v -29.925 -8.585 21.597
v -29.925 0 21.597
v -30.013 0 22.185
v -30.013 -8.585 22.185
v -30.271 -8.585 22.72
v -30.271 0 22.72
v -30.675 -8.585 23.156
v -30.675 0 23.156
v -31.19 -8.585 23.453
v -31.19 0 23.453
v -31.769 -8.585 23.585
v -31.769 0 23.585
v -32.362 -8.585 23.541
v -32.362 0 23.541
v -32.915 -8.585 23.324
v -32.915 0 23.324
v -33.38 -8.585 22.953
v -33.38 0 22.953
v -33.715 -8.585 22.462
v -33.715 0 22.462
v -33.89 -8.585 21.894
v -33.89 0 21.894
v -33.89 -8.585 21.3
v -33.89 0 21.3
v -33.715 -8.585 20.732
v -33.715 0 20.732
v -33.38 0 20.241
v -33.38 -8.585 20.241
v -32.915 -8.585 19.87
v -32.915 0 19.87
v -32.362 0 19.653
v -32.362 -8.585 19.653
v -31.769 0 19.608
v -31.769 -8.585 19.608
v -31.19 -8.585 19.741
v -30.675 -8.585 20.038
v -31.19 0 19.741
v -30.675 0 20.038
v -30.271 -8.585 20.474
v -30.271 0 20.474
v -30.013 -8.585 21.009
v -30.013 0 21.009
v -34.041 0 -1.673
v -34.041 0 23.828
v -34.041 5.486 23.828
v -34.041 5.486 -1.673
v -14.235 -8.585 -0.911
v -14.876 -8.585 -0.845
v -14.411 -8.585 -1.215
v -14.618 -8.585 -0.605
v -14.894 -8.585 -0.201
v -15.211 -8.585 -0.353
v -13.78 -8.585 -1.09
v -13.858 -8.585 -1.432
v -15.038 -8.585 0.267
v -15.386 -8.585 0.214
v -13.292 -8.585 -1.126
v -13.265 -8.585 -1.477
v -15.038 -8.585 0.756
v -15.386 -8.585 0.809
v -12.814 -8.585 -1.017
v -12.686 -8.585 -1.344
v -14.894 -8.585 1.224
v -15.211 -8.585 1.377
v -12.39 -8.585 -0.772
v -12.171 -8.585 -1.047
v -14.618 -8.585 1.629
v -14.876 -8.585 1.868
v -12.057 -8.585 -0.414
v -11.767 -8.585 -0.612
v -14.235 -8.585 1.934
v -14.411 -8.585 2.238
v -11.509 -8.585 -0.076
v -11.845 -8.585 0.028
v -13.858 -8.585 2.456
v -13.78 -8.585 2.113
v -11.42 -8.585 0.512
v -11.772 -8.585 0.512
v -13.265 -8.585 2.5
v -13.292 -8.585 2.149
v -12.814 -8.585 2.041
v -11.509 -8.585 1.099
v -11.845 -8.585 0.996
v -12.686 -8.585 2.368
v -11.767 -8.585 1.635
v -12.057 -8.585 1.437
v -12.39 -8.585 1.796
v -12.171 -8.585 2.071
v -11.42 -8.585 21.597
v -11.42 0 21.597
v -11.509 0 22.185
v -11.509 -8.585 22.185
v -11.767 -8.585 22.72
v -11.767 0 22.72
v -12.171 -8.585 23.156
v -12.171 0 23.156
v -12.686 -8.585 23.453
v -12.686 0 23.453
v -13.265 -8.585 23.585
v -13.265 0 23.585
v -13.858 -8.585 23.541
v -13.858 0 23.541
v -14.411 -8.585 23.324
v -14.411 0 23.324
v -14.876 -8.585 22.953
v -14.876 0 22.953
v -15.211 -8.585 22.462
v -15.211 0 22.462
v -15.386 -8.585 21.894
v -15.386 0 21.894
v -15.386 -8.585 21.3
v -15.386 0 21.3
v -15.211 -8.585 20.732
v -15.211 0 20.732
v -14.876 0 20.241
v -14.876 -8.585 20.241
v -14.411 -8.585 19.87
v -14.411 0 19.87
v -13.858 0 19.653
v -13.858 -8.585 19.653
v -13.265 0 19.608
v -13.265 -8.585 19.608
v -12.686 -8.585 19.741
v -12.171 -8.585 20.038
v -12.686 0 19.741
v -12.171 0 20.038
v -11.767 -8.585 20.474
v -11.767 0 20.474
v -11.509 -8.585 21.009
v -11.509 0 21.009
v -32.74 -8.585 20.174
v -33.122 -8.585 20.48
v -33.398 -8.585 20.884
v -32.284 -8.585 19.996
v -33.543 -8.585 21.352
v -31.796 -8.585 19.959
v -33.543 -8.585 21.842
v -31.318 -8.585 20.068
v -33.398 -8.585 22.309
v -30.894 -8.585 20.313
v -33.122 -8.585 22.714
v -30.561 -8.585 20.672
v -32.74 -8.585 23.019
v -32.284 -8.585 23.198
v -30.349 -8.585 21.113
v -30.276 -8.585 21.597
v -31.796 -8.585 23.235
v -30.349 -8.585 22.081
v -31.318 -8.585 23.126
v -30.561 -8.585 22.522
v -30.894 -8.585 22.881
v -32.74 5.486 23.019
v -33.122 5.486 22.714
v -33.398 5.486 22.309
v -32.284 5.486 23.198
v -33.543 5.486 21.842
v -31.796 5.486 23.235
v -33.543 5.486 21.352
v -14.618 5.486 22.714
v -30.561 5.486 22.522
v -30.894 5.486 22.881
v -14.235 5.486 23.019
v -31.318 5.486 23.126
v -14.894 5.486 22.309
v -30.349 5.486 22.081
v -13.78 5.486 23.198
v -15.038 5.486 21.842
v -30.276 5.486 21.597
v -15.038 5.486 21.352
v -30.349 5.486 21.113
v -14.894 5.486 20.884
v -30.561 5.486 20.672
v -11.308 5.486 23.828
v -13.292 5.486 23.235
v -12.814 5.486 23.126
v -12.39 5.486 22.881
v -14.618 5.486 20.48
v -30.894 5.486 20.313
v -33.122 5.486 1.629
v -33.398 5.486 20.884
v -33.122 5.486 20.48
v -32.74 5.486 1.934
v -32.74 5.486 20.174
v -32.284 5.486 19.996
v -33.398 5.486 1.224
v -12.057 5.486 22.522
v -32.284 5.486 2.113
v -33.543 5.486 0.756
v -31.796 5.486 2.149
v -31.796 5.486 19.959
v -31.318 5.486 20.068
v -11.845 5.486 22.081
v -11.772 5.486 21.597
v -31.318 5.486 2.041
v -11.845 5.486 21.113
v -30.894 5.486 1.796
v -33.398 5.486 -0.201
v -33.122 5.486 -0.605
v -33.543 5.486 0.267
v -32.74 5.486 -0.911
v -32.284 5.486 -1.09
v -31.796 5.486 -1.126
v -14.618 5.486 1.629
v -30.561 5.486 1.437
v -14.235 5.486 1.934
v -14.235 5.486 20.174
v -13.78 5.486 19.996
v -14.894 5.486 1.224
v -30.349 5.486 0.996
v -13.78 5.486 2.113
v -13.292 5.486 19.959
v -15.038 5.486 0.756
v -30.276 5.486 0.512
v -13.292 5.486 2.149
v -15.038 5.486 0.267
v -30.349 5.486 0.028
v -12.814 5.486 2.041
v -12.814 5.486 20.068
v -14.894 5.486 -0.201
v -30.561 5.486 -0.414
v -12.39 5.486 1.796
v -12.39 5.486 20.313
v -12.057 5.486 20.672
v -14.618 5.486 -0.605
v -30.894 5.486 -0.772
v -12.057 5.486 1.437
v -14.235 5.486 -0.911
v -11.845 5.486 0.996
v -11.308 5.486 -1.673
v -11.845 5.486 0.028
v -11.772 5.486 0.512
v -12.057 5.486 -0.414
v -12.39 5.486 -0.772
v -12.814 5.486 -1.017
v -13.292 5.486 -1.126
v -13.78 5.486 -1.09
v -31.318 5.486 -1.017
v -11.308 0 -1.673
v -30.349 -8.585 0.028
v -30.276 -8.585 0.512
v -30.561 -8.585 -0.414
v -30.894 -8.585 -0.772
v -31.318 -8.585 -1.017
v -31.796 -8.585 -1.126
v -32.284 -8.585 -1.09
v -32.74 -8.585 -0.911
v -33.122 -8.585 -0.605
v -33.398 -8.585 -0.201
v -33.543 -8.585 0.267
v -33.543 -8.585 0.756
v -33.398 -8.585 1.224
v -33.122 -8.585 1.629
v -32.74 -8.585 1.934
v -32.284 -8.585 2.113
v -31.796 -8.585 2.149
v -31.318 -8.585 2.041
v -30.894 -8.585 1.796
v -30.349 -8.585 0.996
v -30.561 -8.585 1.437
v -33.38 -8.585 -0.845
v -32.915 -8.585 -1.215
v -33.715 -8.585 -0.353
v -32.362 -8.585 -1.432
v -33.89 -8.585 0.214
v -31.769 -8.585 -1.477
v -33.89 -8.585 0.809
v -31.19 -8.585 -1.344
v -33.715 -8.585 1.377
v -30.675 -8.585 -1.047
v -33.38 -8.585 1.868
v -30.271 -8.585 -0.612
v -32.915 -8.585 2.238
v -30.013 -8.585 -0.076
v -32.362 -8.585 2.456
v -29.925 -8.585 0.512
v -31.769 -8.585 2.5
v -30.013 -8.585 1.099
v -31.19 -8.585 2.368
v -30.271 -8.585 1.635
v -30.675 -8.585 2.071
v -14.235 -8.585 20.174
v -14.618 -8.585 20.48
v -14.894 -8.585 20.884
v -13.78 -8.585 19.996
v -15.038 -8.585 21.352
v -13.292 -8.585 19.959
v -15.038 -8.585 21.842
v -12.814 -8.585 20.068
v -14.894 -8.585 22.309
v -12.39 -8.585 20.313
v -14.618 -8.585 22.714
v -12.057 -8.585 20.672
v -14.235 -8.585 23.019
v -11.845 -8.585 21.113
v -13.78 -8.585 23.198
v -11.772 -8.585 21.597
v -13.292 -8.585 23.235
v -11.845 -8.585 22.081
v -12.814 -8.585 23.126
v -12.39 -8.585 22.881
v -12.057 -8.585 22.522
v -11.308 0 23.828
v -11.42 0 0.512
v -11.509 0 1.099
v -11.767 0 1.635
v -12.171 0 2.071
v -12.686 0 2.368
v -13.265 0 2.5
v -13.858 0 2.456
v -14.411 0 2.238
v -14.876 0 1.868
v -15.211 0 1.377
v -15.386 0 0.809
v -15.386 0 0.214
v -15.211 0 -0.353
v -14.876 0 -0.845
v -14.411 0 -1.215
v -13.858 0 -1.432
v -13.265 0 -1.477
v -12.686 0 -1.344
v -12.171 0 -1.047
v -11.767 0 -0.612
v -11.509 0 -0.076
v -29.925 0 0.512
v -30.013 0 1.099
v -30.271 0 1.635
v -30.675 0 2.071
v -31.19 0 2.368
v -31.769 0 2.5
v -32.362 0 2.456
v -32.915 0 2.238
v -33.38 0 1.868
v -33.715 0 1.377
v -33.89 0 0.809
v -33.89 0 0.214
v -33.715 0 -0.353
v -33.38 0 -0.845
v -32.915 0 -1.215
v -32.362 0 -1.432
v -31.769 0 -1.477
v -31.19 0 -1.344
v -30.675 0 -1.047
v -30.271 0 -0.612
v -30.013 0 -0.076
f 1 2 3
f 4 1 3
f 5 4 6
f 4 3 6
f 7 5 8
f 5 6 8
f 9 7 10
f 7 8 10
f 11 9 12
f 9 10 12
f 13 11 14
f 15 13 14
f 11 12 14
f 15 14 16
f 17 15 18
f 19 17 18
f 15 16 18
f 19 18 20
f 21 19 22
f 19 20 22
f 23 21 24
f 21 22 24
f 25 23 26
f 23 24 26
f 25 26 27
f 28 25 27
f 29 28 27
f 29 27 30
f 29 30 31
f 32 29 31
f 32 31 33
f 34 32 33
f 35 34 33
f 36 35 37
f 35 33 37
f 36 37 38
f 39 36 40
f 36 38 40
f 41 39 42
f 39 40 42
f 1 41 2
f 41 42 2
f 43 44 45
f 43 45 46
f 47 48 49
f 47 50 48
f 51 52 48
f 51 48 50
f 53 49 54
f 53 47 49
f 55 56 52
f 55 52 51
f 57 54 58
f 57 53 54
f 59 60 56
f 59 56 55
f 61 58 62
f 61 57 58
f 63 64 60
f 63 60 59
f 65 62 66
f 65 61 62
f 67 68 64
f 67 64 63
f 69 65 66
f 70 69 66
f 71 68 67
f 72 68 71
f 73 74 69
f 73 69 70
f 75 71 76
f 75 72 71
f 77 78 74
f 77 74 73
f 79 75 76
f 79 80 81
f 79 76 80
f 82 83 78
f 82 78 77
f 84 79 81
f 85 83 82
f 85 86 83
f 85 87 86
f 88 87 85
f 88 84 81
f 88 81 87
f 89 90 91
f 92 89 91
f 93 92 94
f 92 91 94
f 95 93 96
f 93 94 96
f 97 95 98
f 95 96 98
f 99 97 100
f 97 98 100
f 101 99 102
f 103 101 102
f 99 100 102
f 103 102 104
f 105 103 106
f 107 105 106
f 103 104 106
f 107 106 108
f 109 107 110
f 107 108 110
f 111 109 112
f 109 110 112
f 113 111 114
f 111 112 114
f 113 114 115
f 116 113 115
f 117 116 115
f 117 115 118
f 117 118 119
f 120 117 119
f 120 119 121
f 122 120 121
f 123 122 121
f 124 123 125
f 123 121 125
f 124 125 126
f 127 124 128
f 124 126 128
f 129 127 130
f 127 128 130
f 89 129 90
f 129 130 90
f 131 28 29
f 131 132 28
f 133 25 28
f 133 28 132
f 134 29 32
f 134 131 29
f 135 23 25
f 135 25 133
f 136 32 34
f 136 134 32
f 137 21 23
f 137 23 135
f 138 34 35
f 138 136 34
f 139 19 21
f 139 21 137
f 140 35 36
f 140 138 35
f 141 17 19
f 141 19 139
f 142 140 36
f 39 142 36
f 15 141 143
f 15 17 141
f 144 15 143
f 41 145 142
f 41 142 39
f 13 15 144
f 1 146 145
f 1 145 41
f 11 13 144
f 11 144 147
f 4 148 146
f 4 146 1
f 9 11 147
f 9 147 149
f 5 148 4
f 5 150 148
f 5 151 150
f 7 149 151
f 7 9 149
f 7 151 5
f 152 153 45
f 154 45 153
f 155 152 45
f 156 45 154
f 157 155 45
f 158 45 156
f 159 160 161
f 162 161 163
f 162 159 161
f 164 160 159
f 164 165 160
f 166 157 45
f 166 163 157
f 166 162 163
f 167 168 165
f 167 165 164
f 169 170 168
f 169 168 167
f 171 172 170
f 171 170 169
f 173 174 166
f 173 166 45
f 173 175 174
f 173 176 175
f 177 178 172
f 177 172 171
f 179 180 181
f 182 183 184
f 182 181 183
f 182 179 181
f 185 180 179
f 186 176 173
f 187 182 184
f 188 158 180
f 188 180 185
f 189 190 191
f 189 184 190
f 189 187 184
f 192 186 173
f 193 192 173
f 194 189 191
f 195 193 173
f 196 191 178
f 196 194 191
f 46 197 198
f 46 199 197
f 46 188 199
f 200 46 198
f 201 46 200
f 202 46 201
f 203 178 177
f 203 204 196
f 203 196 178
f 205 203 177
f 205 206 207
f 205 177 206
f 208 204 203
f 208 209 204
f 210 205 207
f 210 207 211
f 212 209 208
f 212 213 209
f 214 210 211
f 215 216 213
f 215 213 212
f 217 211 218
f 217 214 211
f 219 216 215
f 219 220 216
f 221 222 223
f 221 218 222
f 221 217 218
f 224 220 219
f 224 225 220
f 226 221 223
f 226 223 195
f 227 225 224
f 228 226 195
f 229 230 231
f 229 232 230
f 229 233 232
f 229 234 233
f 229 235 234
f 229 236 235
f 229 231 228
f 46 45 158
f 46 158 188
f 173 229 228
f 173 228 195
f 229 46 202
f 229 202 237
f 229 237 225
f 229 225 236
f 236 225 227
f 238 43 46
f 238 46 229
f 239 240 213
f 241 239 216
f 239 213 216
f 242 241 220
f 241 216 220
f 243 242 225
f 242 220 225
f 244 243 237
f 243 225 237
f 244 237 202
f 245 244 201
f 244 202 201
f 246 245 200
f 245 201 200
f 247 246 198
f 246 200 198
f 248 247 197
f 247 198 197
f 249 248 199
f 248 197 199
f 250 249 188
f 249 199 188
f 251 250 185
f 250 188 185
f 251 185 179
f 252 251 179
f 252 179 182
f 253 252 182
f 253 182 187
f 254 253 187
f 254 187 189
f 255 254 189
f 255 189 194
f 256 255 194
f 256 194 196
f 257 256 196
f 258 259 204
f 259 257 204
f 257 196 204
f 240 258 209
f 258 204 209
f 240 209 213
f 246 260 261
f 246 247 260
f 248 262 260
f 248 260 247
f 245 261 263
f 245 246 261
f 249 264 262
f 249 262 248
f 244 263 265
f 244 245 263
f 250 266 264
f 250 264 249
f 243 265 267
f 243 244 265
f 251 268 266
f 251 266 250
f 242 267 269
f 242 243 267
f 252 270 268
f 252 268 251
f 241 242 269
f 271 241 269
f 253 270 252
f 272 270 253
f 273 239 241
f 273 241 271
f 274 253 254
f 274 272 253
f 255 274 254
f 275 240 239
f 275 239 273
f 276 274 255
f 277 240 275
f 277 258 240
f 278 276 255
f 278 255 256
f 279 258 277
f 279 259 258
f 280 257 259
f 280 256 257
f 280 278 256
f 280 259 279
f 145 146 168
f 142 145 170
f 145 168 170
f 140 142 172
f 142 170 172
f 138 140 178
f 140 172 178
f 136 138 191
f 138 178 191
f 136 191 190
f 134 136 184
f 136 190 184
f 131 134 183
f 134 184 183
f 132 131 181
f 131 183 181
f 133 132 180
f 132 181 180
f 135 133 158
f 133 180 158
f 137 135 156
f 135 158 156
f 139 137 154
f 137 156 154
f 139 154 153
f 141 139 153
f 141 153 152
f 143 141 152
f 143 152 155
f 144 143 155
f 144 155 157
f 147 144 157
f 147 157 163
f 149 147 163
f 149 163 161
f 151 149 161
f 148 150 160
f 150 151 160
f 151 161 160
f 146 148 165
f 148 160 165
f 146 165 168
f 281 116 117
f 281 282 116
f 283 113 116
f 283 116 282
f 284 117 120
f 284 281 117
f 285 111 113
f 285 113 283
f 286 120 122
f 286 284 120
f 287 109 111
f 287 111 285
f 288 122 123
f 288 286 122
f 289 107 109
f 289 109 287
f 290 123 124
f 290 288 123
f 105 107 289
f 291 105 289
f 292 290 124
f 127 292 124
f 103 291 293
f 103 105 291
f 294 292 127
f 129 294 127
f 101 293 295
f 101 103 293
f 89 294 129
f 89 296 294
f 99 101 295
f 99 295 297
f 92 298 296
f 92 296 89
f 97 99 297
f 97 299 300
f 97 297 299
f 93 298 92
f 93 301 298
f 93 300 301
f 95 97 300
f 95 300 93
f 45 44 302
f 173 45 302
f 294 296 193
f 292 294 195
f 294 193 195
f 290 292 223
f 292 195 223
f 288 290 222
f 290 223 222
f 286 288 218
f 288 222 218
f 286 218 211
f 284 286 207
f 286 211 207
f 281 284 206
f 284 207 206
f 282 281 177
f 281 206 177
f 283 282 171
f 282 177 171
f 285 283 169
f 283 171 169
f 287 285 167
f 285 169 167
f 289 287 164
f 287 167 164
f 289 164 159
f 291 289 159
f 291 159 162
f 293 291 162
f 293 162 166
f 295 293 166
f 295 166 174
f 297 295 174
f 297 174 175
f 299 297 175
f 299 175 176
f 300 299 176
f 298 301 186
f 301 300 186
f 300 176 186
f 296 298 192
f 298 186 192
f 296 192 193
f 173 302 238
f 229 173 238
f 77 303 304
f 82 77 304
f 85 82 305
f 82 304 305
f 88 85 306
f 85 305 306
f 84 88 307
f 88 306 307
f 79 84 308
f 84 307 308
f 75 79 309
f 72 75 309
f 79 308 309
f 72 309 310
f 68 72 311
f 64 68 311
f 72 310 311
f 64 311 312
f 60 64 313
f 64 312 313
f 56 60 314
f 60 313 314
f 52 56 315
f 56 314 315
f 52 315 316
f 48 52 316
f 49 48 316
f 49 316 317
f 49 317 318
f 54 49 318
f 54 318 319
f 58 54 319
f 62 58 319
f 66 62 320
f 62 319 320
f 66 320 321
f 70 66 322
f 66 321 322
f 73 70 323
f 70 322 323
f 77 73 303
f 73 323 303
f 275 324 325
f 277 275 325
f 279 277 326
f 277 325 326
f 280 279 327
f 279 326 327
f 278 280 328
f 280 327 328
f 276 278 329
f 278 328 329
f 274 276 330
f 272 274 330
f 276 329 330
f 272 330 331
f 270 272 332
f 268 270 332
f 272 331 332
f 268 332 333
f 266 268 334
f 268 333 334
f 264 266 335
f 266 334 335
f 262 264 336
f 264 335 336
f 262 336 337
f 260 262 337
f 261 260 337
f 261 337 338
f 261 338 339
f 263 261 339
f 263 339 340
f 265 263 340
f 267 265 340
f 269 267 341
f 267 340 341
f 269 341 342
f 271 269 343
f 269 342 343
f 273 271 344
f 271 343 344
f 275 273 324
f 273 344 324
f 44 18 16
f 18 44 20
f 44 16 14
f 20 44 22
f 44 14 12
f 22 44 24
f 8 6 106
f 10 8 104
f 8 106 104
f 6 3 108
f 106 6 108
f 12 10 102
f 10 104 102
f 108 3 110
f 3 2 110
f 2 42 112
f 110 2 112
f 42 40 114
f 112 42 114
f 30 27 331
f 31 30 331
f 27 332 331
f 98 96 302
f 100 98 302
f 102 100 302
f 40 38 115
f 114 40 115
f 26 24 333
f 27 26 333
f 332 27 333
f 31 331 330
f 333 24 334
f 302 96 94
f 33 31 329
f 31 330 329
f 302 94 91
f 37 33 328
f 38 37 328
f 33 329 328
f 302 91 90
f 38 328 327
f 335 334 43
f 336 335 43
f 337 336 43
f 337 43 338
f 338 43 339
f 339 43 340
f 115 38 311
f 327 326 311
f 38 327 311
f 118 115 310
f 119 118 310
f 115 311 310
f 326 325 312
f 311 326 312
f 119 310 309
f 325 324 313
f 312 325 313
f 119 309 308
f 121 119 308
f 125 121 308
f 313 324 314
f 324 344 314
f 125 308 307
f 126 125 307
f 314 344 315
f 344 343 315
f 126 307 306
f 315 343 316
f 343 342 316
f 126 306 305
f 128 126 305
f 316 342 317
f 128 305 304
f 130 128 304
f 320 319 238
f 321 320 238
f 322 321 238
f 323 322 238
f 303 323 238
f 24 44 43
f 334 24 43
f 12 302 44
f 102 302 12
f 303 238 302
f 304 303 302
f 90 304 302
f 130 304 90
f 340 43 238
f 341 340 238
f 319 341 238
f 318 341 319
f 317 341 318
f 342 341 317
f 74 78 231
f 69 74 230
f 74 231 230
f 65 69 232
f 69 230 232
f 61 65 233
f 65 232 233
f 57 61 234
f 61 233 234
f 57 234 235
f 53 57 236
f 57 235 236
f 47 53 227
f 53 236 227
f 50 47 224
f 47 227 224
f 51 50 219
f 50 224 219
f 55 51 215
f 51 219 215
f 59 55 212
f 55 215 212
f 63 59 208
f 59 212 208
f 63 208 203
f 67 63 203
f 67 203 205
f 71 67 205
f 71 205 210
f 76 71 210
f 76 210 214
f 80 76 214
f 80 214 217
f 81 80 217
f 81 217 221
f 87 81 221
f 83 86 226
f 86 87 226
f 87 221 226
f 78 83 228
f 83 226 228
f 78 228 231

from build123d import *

# Parameters (mm, degrees)
SKETCH1_W               = 22.733
SKETCH1_H               = 25.5016
BOSS_EXTRUDE1_DEPTH     = 5.4864
SKETCH2_R               = 1.9939
SKETCH2_R_2             = 1.642387972
BOSS_EXTRUDE2_DEPTH     = 8.5852
SKETCH5_R               = 1.642387972
CUT_EXTRUDE1_DEPTH      = 1
CUT_EXTRUDE1_DEPTH_BACK = 15.0716


with BuildPart() as part:
    # Sketch1 → Boss-Extrude1 (new body)
    with BuildSketch(Plane(origin=(0, 0, 0), x_dir=(1, 0, 0), z_dir=(0, 1, 0))):
        with Locations((-22.674199551, -11.077689686)):
            Rectangle(SKETCH1_W, SKETCH1_H)
    extrude(amount=BOSS_EXTRUDE1_DEPTH)

    # Sketch2 → Boss-Extrude2 (add)
    with BuildSketch(Plane.XZ):
        with Locations((-31.918497565, 21.596793601)):
            Circle(SKETCH2_R)
        with Locations((-31.918497565, 21.596793601)):
            Circle(SKETCH2_R_2, mode=Mode.SUBTRACT)
        with Locations((-13.414259747, 21.596793601)):
            Circle(SKETCH2_R)
        with Locations((-13.414259747, 21.596793601)):
            Circle(SKETCH2_R_2, mode=Mode.SUBTRACT)
        with Locations((-31.918497565, 0.511660399)):
            Circle(SKETCH2_R)
        with Locations((-31.918497565, 0.511660399)):
            Circle(SKETCH2_R_2, mode=Mode.SUBTRACT)
        with Locations((-13.414259747, 0.511660399)):
            Circle(SKETCH2_R)
        with Locations((-13.414259747, 0.511660399)):
            Circle(SKETCH2_R_2, mode=Mode.SUBTRACT)
    extrude(amount=BOSS_EXTRUDE2_DEPTH)

    # Sketch5 → Cut-Extrude1 (cut, two sides)
    with BuildSketch(Plane(origin=(0, 5.4864, 0), x_dir=(1, 0, 0), z_dir=(0, 1, 0))) as cut_extrude1_sk:
        with Locations((-31.918497565, -0.511660399)):
            Circle(SKETCH5_R)
        with Locations((-13.414259747, -0.511660399)):
            Circle(SKETCH5_R)
        with Locations((-13.414259747, -21.596793601)):
            Circle(SKETCH5_R)
        with Locations((-31.918497565, -21.596793601)):
            Circle(SKETCH5_R)
    extrude(amount=CUT_EXTRUDE1_DEPTH, mode=Mode.SUBTRACT)
    extrude(cut_extrude1_sk.sketch, amount=-CUT_EXTRUDE1_DEPTH_BACK, mode=Mode.SUBTRACT)


solid = part.part
